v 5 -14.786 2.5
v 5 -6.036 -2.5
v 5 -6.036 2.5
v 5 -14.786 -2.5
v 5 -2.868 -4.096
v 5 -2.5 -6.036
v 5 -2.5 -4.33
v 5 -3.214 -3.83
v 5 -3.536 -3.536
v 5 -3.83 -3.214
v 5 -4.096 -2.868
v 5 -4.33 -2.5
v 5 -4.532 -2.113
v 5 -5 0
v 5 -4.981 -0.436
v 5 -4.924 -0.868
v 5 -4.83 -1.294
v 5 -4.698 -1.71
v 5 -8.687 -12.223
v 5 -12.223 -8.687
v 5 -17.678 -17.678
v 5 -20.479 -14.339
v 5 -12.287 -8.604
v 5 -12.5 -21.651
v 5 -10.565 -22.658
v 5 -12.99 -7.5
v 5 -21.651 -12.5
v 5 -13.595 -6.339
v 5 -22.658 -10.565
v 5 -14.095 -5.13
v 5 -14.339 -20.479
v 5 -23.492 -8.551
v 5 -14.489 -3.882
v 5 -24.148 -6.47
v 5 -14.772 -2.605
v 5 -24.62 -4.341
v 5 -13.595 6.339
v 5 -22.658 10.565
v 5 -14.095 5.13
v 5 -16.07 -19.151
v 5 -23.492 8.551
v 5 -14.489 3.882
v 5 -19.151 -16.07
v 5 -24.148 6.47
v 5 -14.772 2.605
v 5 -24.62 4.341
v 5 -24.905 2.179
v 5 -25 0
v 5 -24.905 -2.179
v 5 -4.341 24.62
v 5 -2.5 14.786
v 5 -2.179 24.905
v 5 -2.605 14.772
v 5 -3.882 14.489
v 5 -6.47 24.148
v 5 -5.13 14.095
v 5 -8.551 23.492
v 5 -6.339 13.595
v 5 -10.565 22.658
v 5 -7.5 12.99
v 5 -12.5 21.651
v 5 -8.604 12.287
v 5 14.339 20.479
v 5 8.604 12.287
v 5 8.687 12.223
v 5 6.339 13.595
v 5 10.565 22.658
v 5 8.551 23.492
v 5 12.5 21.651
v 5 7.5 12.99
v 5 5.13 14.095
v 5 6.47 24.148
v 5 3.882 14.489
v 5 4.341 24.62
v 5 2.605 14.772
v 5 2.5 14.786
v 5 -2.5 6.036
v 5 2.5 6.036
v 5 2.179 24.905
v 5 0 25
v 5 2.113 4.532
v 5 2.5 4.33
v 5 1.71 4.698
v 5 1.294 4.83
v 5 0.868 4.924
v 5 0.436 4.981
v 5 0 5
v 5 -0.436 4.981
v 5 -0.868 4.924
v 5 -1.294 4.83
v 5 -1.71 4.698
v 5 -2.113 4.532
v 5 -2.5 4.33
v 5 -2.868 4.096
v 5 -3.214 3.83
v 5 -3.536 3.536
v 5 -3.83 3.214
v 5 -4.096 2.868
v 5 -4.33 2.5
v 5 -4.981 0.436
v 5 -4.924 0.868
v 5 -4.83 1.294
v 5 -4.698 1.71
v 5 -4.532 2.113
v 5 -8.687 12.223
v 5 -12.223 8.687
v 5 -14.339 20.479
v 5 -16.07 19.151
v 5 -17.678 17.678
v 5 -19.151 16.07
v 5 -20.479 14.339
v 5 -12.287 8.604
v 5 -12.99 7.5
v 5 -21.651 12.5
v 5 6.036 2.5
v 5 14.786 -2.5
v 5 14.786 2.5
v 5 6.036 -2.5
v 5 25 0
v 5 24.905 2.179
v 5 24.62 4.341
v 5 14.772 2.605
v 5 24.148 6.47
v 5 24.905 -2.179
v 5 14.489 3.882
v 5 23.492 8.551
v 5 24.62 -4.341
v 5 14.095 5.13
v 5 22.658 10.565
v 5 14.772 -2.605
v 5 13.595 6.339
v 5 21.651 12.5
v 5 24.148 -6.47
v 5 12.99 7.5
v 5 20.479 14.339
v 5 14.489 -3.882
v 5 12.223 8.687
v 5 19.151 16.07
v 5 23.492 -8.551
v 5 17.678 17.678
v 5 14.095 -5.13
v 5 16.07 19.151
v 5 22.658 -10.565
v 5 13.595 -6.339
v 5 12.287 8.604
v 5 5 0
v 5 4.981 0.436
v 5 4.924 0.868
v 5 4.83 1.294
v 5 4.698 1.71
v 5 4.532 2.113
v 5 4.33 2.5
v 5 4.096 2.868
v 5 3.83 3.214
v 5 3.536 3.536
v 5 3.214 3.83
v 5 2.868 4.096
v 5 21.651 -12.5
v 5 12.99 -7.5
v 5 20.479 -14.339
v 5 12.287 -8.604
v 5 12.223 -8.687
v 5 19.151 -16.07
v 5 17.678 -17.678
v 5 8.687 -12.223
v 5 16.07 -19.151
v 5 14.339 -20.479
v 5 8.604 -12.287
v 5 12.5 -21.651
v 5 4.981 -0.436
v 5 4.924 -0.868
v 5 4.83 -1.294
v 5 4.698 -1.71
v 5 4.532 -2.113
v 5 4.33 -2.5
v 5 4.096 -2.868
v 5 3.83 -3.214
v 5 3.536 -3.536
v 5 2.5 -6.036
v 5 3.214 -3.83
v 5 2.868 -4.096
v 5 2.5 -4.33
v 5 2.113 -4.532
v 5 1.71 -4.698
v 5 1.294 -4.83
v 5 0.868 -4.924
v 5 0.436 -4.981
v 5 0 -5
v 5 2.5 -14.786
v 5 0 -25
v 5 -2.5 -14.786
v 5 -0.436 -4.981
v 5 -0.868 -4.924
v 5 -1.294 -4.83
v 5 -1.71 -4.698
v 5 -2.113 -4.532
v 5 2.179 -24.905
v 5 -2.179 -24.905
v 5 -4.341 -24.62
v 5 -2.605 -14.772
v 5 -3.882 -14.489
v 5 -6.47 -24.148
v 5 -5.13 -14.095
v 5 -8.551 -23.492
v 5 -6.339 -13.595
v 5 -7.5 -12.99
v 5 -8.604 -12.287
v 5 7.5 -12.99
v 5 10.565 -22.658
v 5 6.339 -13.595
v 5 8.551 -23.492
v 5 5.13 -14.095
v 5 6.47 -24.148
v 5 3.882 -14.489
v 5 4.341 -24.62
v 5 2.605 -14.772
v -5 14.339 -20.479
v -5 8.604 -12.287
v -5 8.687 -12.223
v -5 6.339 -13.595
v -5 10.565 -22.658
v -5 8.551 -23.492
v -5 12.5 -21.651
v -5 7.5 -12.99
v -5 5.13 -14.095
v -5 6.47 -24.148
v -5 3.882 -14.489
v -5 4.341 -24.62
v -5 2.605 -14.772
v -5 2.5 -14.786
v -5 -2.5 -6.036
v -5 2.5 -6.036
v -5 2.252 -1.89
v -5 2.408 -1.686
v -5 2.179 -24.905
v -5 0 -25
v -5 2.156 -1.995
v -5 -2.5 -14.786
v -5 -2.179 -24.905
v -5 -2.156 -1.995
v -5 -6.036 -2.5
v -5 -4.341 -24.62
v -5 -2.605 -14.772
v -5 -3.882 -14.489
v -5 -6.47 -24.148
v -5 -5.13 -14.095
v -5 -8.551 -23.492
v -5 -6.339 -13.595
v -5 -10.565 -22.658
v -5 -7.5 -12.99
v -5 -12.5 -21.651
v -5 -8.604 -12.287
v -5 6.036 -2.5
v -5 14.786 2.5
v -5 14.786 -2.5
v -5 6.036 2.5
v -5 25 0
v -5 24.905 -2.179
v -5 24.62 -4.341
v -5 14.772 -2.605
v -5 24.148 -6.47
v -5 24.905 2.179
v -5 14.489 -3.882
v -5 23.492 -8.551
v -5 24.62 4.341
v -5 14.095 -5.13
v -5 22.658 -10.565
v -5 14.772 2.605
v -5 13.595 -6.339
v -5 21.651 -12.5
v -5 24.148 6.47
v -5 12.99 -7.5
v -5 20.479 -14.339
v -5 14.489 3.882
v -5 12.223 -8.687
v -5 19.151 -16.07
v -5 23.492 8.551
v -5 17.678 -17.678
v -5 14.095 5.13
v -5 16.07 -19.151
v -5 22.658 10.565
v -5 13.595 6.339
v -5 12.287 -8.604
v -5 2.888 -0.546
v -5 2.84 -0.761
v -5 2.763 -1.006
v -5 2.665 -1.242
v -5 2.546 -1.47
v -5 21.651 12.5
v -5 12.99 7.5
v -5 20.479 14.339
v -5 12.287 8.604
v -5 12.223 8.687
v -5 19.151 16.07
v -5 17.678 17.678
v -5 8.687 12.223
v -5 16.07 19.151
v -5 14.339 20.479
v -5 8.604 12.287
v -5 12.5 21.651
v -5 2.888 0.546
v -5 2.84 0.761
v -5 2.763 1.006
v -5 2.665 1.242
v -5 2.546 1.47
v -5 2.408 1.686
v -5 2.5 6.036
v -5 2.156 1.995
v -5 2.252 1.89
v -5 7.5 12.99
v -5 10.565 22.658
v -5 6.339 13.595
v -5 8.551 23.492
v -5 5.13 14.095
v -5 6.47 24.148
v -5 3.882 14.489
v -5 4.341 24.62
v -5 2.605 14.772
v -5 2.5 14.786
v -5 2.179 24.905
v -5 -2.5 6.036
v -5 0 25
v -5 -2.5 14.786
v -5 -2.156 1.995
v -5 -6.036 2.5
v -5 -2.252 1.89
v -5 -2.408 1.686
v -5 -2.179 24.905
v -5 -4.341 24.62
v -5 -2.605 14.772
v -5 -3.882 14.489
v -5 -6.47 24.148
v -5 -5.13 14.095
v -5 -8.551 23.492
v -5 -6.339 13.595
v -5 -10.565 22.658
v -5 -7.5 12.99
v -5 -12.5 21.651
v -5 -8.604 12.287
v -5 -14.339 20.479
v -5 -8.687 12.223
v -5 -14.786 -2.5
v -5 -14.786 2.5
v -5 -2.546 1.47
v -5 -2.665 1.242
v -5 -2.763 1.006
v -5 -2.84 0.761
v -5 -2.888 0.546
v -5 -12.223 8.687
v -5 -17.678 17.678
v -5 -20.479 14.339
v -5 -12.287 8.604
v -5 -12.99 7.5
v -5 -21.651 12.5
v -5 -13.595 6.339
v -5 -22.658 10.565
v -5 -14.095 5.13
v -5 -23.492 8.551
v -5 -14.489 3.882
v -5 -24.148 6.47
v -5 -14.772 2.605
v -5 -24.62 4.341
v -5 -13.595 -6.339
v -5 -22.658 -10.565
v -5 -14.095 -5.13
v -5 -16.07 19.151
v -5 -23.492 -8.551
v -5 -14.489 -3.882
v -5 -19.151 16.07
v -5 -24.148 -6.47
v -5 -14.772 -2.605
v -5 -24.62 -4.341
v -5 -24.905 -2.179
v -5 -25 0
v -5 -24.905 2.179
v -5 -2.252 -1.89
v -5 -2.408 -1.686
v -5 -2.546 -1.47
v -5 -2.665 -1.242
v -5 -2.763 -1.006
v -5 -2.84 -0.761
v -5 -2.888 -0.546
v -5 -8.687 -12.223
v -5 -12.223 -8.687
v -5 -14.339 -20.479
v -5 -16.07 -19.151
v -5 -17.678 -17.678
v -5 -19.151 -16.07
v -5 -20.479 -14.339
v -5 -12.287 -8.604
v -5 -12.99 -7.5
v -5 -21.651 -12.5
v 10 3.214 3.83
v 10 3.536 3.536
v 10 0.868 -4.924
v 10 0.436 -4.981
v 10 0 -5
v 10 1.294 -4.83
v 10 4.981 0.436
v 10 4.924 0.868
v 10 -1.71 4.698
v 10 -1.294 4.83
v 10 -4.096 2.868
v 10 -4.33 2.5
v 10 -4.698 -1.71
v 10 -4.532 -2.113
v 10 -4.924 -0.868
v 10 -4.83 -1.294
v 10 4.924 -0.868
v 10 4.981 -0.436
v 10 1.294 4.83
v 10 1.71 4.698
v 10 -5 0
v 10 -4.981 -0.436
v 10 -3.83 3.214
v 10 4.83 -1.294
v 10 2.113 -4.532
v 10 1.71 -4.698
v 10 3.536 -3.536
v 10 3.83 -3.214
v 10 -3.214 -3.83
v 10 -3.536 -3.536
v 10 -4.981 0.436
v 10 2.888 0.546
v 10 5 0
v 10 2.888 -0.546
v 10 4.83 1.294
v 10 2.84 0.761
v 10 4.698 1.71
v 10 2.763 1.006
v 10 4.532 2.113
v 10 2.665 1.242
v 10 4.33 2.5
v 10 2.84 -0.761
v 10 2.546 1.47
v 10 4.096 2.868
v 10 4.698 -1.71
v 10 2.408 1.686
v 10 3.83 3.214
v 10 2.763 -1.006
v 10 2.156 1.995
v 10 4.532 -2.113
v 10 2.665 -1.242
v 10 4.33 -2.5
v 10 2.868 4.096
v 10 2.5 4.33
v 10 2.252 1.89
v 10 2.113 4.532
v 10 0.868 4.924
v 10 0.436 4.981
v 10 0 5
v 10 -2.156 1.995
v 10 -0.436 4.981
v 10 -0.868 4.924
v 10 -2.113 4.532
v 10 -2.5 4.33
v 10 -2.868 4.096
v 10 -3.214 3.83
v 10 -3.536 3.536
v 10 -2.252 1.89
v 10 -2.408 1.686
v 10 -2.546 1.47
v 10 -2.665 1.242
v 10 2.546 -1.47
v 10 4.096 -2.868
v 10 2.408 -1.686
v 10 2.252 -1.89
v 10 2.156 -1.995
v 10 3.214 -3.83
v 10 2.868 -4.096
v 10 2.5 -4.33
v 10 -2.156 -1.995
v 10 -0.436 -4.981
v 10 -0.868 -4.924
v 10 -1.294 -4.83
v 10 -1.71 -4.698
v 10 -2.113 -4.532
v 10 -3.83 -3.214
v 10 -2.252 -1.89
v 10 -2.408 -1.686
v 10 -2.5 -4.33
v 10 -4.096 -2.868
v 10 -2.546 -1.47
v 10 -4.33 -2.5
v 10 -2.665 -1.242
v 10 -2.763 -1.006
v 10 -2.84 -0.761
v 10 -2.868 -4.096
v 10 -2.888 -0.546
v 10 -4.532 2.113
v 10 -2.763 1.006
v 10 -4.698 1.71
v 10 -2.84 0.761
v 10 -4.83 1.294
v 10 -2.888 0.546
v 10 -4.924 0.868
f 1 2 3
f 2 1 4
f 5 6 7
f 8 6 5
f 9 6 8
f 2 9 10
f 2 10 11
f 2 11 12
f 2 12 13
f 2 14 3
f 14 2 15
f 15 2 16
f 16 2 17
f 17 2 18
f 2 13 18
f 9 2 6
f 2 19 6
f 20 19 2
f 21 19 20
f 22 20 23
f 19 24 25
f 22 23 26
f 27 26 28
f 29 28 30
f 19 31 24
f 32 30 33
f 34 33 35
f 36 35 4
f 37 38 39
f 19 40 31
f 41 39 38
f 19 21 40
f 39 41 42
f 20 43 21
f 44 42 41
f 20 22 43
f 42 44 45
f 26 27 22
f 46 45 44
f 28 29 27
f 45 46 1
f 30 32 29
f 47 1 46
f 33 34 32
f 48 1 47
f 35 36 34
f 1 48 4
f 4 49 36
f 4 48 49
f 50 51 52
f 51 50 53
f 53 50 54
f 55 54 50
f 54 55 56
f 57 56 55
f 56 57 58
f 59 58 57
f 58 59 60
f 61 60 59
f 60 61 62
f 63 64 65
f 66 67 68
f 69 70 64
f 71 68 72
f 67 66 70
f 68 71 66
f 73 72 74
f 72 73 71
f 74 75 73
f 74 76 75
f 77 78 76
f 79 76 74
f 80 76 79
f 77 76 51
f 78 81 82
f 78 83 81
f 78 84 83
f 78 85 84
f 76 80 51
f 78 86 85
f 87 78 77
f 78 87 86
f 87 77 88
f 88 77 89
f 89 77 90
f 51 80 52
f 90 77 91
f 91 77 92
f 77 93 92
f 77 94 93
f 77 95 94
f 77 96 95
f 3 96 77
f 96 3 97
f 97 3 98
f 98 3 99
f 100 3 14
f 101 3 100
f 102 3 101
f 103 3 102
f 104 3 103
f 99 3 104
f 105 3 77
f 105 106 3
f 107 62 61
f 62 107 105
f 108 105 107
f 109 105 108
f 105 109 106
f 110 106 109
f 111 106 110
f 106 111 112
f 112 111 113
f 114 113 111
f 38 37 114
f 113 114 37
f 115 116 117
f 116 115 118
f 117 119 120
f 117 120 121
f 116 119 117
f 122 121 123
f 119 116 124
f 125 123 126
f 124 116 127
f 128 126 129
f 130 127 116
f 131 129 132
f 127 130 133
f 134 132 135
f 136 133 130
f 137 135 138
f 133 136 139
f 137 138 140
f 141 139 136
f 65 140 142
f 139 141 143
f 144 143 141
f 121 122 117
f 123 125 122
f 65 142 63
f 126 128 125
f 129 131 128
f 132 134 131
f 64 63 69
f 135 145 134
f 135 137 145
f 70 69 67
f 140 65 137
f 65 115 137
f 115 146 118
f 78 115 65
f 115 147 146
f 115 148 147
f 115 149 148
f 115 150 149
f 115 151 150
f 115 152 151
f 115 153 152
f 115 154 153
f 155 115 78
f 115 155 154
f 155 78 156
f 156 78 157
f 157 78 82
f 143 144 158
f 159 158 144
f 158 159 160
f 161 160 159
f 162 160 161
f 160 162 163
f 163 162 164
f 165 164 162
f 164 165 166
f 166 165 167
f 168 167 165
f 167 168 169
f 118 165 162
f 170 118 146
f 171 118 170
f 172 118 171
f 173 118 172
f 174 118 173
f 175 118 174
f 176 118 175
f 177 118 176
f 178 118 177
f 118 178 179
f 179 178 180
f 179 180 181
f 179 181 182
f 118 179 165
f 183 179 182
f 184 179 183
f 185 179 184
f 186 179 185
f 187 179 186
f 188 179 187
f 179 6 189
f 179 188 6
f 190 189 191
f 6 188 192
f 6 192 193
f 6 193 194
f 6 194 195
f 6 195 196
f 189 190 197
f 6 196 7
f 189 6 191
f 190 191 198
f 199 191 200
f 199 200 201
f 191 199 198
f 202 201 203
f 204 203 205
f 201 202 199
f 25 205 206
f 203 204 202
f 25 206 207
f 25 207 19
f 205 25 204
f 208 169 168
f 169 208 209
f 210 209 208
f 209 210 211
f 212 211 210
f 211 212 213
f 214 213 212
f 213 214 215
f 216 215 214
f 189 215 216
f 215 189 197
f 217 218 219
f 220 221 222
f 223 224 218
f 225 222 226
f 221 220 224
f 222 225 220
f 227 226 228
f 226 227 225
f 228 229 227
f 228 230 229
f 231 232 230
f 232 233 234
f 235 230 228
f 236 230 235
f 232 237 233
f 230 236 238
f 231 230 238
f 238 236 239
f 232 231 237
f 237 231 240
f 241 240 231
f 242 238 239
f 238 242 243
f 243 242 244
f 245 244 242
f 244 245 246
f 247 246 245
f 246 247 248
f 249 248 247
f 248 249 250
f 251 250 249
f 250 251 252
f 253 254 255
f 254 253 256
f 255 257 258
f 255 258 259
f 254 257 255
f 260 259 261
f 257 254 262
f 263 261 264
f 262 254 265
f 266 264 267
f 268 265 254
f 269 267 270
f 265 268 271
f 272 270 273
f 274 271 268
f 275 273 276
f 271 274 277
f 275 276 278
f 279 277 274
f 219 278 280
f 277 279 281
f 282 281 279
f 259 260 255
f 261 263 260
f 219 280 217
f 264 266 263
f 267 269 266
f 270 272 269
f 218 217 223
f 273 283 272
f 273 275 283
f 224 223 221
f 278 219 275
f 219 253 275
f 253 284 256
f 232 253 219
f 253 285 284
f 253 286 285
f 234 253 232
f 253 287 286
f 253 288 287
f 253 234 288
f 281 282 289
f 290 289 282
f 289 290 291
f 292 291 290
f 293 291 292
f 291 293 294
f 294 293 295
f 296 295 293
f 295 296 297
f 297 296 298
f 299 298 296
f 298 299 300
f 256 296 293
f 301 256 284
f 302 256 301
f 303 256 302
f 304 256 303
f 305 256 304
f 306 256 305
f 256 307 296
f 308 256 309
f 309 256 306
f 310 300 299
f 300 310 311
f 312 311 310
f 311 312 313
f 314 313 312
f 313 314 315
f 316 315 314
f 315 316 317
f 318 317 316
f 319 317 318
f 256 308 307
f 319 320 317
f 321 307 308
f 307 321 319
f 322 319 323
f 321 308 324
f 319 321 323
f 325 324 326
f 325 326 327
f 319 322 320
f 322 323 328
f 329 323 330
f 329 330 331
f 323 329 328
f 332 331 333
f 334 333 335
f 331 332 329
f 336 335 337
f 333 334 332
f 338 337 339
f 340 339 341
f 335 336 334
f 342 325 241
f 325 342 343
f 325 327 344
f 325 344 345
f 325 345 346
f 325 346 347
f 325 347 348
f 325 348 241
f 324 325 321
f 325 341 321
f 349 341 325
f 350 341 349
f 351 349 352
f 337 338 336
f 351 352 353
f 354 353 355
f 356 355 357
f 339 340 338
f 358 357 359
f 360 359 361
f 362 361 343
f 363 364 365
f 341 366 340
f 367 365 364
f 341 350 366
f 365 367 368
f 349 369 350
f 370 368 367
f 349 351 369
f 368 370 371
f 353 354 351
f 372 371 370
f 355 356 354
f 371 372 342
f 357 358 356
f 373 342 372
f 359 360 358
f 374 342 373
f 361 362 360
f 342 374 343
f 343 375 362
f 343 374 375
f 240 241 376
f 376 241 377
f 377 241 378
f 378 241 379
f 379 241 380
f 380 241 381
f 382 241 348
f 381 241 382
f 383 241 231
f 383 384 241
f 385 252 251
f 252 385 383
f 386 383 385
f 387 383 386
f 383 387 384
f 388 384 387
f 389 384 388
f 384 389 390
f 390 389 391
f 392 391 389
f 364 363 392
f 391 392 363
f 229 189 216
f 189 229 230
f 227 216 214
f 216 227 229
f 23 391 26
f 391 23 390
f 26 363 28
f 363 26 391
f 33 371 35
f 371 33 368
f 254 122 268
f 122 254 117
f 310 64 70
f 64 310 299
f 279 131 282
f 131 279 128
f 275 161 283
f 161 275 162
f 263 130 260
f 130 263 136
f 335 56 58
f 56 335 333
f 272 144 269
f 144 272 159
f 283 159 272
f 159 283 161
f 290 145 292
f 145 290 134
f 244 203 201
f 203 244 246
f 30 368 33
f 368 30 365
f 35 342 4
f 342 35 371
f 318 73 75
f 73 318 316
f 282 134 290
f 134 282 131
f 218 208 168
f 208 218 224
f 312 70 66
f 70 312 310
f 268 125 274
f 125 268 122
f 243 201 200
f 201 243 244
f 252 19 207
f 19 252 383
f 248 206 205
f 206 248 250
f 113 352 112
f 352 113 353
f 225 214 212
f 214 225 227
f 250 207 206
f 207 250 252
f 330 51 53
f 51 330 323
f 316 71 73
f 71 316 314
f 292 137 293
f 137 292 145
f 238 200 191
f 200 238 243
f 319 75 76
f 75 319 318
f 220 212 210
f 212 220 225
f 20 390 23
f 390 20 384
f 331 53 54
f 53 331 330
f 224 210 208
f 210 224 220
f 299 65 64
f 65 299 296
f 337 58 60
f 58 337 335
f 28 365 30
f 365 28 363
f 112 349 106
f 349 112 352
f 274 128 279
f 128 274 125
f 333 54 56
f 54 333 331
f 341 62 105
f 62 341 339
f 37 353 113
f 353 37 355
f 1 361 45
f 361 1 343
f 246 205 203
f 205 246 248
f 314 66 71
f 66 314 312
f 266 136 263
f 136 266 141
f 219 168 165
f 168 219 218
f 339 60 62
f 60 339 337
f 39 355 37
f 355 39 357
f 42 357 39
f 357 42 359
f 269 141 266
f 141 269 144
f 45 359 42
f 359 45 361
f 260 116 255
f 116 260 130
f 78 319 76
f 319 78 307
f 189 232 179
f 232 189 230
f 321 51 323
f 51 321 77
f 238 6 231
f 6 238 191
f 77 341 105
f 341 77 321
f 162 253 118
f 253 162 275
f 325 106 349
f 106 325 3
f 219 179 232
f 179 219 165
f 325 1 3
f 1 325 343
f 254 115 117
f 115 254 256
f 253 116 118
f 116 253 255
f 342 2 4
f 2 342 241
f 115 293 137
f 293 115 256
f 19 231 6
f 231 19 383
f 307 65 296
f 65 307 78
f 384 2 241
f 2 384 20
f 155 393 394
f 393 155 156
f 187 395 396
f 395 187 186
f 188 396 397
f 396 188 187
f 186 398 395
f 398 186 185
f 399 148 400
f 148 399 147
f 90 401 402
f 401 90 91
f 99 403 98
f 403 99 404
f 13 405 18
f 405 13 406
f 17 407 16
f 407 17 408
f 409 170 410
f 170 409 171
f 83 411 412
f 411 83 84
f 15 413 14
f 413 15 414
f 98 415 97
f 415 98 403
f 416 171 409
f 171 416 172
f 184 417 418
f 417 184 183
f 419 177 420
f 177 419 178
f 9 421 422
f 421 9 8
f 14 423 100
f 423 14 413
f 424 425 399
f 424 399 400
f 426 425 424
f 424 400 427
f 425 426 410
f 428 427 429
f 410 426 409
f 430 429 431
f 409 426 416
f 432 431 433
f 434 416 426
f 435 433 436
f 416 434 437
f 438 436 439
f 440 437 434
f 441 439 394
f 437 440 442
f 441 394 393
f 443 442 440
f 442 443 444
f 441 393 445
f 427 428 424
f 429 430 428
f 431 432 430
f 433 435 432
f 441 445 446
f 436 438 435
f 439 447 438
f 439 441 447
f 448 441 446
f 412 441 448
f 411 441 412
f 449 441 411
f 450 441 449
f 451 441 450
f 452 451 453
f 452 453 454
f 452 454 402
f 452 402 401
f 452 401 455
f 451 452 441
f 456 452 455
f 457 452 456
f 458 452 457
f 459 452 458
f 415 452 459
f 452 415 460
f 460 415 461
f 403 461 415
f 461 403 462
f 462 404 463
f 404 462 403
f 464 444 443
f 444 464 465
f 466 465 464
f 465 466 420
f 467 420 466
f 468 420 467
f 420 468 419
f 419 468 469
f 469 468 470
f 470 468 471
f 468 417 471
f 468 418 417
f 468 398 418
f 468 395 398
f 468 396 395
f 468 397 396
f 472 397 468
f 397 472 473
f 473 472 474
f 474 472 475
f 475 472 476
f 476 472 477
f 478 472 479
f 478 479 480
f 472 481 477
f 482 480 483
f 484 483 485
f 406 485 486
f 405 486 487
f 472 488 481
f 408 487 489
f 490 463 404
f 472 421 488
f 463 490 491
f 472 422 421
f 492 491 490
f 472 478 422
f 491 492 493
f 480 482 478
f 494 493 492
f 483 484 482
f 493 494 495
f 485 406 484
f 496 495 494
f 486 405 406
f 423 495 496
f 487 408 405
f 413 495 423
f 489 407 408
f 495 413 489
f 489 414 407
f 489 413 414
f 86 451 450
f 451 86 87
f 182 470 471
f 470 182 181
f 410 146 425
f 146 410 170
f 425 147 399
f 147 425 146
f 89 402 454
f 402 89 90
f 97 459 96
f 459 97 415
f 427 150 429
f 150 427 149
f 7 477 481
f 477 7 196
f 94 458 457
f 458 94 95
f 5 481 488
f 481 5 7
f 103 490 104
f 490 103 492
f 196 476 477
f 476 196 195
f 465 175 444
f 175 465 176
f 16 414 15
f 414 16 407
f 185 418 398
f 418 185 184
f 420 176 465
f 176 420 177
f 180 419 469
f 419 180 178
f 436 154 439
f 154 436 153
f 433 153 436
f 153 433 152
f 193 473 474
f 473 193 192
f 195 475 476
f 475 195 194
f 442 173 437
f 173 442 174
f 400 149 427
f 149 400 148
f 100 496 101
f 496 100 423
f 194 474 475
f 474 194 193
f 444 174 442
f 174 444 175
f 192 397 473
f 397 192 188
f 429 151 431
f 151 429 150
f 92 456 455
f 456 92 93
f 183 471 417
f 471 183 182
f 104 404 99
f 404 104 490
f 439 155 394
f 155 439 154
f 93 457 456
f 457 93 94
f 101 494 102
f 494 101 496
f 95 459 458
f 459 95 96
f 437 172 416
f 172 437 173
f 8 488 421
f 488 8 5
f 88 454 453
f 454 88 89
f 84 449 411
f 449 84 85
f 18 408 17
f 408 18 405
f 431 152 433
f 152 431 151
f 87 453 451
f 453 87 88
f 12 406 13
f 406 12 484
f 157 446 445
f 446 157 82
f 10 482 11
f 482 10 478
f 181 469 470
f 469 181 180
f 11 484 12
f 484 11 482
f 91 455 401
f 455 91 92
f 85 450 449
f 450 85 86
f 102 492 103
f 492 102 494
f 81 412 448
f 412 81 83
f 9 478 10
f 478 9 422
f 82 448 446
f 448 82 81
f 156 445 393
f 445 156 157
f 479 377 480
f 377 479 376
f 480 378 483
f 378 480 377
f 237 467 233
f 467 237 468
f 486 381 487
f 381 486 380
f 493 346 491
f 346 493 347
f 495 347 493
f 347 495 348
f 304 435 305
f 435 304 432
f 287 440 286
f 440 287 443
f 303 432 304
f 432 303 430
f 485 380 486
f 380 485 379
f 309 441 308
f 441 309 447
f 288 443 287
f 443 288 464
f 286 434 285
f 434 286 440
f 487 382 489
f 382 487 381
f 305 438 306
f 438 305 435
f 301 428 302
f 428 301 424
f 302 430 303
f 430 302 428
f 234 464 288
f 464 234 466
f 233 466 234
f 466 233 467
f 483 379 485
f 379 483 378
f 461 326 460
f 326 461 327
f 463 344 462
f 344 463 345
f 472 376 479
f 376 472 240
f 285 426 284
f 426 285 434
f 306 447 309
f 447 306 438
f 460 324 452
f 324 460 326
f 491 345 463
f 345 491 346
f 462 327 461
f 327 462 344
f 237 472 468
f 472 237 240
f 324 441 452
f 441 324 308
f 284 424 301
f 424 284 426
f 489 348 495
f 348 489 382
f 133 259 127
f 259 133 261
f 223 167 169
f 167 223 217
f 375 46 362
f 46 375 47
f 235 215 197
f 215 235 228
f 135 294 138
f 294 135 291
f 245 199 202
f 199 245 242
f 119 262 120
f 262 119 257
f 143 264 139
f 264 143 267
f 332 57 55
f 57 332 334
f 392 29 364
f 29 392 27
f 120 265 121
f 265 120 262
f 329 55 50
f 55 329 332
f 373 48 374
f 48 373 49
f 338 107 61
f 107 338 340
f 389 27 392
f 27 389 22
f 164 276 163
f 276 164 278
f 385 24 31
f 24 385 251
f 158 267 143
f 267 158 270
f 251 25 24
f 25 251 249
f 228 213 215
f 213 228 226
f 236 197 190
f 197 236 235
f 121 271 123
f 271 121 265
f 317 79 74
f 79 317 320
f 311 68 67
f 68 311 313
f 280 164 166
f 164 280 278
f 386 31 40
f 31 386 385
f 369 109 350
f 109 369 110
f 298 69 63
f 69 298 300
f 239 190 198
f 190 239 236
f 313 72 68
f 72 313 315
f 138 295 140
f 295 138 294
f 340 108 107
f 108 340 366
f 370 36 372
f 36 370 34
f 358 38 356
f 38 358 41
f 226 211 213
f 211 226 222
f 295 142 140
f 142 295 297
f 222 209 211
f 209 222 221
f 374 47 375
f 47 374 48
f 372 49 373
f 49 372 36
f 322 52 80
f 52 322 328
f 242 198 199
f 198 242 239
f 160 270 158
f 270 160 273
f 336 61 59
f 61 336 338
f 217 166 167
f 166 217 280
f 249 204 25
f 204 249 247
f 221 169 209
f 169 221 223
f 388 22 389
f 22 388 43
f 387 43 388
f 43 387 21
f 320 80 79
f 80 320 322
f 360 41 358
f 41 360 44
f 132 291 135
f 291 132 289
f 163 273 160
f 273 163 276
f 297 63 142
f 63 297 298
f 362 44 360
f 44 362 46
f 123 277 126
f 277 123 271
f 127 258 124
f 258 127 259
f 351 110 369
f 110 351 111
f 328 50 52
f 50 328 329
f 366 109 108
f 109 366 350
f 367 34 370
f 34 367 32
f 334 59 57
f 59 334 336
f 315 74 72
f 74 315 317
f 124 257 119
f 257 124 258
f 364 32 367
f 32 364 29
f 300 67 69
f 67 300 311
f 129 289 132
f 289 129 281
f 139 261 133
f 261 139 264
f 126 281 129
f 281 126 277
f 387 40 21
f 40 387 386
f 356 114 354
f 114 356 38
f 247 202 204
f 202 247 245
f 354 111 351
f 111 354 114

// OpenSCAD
// file: Motor.scad
$fn = 72;

motor();

translate([11,0,0])
motor_mount();

//translate([-11,0,0])
//motor_mount();

module motor()
{
    translate([0,-7.5,0])
    rotate([90,0,90])
    difference()
    {
        union()
        {
            color("yellow")
            cube([37, 22.5, 19], center=true);
            
            color("yellow")
            translate([18.5 + 2.5,0,0])
            cube([5, 5, 3], center=true);
            
            color("grey")
            translate([-(18.5 + 14), 0, ])
            rotate([0,90,0])
            intersection()
            {
                cylinder(d=22.5, h=28, center=true);
                cube([19,22.5, 28], center=true);
            }
            
            color("white")
            translate([18.5 - 11,0,0])
            shaft();
        }
        
        rotate([0,90,-90])
        mounting_holes();
    }
}

module shaft(keyed=true)
{
    intersection()
    {
        cylinder(d=5.6, h=37, center=true);
        
        if (keyed)
        {
            cube([3.8, 5.5, 37], center=true);
        }
    }
}

module mounting_holes()
{
    rotate([90,0,90])
    union()
    {
        translate([-(18.5 - 5), 17.5/2, 0])
        cylinder(d=3.5, h=19*2, center=true);
        
        translate([-(18.5 - 5), -17.5/2, 0])
        cylinder(d=3.5, h=19*2, center=true);
    }
}

module motor_mount(thickness=3)
{
    mount_height = 8;
    
    translate([0,-7.5,0])
    
    union()
    {
        // Mounting for the motor
        difference()
        {
            translate([0,0,1.25 - mount_height/2])
            cube([thickness, 40, mount_height + 22.5 + 2.5], center=true);
            
            union()
            {
                mounting_holes();
                
                translate([0, 18.5 - 11,0])
                rotate([0,90,0])
                cylinder(d=7.5, h=37, center=true);
            }
        }
        
        // Support for the motor
        difference()
        {
            union()
            {
                for (y_offset = [-15, 7.5])
                {
                    translate([-10.5, y_offset, -(mount_height/2 + 22.5/2)])
                    cube([18,4,mount_height], center=true);
                }
            }
            
            for (x_offset = [-15, -6])
            {
                translate([x_offset,0,-(mount_height/2 + 22.5/2)])
                union()
                {
                    rotate([90,0,0])
                    cylinder(d=3.5,h=40, center=true); 
                }
            }
        }
    }
}
// main file
use <Motor.scad>;

$fn=72;

wheel();

module wheel(diameter=65, width=20)
{
    rotate([0,90,0])
    
    union()
    {
        difference()
        {
            color("black")
            hub();
            scale([1.05,1.05,1])
            shaft();
        }
        
        color("white")
        tire();
    }
}

module wheel_well(height=50, width=20)
{
    cube([width, height, height], center=true);
}


module hub(diameter=40, width=10, thickness=5)
{
    tube(d=diameter, h=width, t=thickness, center=true);
    
    for (angle = [0:45:135])
    {
        rotate([0,0,angle])
        cube([diameter-thickness, thickness, width], center=true);
    }
    
    translate([0,0,width/2 + width/4])
    cylinder(d=thickness*2, h=width/2, center=true);
}

module tire(diameter=50, width=10, thickness=5)
{
    tube(d=diameter, h=width, t=thickness, center=true);
}

module tube(d, h, t, center=false)
{
    difference()
    {
        cylinder(d=d, h=h, center=center);
        cylinder(d=(d-(t*2)), h=h*2, center=center);
    }
}
